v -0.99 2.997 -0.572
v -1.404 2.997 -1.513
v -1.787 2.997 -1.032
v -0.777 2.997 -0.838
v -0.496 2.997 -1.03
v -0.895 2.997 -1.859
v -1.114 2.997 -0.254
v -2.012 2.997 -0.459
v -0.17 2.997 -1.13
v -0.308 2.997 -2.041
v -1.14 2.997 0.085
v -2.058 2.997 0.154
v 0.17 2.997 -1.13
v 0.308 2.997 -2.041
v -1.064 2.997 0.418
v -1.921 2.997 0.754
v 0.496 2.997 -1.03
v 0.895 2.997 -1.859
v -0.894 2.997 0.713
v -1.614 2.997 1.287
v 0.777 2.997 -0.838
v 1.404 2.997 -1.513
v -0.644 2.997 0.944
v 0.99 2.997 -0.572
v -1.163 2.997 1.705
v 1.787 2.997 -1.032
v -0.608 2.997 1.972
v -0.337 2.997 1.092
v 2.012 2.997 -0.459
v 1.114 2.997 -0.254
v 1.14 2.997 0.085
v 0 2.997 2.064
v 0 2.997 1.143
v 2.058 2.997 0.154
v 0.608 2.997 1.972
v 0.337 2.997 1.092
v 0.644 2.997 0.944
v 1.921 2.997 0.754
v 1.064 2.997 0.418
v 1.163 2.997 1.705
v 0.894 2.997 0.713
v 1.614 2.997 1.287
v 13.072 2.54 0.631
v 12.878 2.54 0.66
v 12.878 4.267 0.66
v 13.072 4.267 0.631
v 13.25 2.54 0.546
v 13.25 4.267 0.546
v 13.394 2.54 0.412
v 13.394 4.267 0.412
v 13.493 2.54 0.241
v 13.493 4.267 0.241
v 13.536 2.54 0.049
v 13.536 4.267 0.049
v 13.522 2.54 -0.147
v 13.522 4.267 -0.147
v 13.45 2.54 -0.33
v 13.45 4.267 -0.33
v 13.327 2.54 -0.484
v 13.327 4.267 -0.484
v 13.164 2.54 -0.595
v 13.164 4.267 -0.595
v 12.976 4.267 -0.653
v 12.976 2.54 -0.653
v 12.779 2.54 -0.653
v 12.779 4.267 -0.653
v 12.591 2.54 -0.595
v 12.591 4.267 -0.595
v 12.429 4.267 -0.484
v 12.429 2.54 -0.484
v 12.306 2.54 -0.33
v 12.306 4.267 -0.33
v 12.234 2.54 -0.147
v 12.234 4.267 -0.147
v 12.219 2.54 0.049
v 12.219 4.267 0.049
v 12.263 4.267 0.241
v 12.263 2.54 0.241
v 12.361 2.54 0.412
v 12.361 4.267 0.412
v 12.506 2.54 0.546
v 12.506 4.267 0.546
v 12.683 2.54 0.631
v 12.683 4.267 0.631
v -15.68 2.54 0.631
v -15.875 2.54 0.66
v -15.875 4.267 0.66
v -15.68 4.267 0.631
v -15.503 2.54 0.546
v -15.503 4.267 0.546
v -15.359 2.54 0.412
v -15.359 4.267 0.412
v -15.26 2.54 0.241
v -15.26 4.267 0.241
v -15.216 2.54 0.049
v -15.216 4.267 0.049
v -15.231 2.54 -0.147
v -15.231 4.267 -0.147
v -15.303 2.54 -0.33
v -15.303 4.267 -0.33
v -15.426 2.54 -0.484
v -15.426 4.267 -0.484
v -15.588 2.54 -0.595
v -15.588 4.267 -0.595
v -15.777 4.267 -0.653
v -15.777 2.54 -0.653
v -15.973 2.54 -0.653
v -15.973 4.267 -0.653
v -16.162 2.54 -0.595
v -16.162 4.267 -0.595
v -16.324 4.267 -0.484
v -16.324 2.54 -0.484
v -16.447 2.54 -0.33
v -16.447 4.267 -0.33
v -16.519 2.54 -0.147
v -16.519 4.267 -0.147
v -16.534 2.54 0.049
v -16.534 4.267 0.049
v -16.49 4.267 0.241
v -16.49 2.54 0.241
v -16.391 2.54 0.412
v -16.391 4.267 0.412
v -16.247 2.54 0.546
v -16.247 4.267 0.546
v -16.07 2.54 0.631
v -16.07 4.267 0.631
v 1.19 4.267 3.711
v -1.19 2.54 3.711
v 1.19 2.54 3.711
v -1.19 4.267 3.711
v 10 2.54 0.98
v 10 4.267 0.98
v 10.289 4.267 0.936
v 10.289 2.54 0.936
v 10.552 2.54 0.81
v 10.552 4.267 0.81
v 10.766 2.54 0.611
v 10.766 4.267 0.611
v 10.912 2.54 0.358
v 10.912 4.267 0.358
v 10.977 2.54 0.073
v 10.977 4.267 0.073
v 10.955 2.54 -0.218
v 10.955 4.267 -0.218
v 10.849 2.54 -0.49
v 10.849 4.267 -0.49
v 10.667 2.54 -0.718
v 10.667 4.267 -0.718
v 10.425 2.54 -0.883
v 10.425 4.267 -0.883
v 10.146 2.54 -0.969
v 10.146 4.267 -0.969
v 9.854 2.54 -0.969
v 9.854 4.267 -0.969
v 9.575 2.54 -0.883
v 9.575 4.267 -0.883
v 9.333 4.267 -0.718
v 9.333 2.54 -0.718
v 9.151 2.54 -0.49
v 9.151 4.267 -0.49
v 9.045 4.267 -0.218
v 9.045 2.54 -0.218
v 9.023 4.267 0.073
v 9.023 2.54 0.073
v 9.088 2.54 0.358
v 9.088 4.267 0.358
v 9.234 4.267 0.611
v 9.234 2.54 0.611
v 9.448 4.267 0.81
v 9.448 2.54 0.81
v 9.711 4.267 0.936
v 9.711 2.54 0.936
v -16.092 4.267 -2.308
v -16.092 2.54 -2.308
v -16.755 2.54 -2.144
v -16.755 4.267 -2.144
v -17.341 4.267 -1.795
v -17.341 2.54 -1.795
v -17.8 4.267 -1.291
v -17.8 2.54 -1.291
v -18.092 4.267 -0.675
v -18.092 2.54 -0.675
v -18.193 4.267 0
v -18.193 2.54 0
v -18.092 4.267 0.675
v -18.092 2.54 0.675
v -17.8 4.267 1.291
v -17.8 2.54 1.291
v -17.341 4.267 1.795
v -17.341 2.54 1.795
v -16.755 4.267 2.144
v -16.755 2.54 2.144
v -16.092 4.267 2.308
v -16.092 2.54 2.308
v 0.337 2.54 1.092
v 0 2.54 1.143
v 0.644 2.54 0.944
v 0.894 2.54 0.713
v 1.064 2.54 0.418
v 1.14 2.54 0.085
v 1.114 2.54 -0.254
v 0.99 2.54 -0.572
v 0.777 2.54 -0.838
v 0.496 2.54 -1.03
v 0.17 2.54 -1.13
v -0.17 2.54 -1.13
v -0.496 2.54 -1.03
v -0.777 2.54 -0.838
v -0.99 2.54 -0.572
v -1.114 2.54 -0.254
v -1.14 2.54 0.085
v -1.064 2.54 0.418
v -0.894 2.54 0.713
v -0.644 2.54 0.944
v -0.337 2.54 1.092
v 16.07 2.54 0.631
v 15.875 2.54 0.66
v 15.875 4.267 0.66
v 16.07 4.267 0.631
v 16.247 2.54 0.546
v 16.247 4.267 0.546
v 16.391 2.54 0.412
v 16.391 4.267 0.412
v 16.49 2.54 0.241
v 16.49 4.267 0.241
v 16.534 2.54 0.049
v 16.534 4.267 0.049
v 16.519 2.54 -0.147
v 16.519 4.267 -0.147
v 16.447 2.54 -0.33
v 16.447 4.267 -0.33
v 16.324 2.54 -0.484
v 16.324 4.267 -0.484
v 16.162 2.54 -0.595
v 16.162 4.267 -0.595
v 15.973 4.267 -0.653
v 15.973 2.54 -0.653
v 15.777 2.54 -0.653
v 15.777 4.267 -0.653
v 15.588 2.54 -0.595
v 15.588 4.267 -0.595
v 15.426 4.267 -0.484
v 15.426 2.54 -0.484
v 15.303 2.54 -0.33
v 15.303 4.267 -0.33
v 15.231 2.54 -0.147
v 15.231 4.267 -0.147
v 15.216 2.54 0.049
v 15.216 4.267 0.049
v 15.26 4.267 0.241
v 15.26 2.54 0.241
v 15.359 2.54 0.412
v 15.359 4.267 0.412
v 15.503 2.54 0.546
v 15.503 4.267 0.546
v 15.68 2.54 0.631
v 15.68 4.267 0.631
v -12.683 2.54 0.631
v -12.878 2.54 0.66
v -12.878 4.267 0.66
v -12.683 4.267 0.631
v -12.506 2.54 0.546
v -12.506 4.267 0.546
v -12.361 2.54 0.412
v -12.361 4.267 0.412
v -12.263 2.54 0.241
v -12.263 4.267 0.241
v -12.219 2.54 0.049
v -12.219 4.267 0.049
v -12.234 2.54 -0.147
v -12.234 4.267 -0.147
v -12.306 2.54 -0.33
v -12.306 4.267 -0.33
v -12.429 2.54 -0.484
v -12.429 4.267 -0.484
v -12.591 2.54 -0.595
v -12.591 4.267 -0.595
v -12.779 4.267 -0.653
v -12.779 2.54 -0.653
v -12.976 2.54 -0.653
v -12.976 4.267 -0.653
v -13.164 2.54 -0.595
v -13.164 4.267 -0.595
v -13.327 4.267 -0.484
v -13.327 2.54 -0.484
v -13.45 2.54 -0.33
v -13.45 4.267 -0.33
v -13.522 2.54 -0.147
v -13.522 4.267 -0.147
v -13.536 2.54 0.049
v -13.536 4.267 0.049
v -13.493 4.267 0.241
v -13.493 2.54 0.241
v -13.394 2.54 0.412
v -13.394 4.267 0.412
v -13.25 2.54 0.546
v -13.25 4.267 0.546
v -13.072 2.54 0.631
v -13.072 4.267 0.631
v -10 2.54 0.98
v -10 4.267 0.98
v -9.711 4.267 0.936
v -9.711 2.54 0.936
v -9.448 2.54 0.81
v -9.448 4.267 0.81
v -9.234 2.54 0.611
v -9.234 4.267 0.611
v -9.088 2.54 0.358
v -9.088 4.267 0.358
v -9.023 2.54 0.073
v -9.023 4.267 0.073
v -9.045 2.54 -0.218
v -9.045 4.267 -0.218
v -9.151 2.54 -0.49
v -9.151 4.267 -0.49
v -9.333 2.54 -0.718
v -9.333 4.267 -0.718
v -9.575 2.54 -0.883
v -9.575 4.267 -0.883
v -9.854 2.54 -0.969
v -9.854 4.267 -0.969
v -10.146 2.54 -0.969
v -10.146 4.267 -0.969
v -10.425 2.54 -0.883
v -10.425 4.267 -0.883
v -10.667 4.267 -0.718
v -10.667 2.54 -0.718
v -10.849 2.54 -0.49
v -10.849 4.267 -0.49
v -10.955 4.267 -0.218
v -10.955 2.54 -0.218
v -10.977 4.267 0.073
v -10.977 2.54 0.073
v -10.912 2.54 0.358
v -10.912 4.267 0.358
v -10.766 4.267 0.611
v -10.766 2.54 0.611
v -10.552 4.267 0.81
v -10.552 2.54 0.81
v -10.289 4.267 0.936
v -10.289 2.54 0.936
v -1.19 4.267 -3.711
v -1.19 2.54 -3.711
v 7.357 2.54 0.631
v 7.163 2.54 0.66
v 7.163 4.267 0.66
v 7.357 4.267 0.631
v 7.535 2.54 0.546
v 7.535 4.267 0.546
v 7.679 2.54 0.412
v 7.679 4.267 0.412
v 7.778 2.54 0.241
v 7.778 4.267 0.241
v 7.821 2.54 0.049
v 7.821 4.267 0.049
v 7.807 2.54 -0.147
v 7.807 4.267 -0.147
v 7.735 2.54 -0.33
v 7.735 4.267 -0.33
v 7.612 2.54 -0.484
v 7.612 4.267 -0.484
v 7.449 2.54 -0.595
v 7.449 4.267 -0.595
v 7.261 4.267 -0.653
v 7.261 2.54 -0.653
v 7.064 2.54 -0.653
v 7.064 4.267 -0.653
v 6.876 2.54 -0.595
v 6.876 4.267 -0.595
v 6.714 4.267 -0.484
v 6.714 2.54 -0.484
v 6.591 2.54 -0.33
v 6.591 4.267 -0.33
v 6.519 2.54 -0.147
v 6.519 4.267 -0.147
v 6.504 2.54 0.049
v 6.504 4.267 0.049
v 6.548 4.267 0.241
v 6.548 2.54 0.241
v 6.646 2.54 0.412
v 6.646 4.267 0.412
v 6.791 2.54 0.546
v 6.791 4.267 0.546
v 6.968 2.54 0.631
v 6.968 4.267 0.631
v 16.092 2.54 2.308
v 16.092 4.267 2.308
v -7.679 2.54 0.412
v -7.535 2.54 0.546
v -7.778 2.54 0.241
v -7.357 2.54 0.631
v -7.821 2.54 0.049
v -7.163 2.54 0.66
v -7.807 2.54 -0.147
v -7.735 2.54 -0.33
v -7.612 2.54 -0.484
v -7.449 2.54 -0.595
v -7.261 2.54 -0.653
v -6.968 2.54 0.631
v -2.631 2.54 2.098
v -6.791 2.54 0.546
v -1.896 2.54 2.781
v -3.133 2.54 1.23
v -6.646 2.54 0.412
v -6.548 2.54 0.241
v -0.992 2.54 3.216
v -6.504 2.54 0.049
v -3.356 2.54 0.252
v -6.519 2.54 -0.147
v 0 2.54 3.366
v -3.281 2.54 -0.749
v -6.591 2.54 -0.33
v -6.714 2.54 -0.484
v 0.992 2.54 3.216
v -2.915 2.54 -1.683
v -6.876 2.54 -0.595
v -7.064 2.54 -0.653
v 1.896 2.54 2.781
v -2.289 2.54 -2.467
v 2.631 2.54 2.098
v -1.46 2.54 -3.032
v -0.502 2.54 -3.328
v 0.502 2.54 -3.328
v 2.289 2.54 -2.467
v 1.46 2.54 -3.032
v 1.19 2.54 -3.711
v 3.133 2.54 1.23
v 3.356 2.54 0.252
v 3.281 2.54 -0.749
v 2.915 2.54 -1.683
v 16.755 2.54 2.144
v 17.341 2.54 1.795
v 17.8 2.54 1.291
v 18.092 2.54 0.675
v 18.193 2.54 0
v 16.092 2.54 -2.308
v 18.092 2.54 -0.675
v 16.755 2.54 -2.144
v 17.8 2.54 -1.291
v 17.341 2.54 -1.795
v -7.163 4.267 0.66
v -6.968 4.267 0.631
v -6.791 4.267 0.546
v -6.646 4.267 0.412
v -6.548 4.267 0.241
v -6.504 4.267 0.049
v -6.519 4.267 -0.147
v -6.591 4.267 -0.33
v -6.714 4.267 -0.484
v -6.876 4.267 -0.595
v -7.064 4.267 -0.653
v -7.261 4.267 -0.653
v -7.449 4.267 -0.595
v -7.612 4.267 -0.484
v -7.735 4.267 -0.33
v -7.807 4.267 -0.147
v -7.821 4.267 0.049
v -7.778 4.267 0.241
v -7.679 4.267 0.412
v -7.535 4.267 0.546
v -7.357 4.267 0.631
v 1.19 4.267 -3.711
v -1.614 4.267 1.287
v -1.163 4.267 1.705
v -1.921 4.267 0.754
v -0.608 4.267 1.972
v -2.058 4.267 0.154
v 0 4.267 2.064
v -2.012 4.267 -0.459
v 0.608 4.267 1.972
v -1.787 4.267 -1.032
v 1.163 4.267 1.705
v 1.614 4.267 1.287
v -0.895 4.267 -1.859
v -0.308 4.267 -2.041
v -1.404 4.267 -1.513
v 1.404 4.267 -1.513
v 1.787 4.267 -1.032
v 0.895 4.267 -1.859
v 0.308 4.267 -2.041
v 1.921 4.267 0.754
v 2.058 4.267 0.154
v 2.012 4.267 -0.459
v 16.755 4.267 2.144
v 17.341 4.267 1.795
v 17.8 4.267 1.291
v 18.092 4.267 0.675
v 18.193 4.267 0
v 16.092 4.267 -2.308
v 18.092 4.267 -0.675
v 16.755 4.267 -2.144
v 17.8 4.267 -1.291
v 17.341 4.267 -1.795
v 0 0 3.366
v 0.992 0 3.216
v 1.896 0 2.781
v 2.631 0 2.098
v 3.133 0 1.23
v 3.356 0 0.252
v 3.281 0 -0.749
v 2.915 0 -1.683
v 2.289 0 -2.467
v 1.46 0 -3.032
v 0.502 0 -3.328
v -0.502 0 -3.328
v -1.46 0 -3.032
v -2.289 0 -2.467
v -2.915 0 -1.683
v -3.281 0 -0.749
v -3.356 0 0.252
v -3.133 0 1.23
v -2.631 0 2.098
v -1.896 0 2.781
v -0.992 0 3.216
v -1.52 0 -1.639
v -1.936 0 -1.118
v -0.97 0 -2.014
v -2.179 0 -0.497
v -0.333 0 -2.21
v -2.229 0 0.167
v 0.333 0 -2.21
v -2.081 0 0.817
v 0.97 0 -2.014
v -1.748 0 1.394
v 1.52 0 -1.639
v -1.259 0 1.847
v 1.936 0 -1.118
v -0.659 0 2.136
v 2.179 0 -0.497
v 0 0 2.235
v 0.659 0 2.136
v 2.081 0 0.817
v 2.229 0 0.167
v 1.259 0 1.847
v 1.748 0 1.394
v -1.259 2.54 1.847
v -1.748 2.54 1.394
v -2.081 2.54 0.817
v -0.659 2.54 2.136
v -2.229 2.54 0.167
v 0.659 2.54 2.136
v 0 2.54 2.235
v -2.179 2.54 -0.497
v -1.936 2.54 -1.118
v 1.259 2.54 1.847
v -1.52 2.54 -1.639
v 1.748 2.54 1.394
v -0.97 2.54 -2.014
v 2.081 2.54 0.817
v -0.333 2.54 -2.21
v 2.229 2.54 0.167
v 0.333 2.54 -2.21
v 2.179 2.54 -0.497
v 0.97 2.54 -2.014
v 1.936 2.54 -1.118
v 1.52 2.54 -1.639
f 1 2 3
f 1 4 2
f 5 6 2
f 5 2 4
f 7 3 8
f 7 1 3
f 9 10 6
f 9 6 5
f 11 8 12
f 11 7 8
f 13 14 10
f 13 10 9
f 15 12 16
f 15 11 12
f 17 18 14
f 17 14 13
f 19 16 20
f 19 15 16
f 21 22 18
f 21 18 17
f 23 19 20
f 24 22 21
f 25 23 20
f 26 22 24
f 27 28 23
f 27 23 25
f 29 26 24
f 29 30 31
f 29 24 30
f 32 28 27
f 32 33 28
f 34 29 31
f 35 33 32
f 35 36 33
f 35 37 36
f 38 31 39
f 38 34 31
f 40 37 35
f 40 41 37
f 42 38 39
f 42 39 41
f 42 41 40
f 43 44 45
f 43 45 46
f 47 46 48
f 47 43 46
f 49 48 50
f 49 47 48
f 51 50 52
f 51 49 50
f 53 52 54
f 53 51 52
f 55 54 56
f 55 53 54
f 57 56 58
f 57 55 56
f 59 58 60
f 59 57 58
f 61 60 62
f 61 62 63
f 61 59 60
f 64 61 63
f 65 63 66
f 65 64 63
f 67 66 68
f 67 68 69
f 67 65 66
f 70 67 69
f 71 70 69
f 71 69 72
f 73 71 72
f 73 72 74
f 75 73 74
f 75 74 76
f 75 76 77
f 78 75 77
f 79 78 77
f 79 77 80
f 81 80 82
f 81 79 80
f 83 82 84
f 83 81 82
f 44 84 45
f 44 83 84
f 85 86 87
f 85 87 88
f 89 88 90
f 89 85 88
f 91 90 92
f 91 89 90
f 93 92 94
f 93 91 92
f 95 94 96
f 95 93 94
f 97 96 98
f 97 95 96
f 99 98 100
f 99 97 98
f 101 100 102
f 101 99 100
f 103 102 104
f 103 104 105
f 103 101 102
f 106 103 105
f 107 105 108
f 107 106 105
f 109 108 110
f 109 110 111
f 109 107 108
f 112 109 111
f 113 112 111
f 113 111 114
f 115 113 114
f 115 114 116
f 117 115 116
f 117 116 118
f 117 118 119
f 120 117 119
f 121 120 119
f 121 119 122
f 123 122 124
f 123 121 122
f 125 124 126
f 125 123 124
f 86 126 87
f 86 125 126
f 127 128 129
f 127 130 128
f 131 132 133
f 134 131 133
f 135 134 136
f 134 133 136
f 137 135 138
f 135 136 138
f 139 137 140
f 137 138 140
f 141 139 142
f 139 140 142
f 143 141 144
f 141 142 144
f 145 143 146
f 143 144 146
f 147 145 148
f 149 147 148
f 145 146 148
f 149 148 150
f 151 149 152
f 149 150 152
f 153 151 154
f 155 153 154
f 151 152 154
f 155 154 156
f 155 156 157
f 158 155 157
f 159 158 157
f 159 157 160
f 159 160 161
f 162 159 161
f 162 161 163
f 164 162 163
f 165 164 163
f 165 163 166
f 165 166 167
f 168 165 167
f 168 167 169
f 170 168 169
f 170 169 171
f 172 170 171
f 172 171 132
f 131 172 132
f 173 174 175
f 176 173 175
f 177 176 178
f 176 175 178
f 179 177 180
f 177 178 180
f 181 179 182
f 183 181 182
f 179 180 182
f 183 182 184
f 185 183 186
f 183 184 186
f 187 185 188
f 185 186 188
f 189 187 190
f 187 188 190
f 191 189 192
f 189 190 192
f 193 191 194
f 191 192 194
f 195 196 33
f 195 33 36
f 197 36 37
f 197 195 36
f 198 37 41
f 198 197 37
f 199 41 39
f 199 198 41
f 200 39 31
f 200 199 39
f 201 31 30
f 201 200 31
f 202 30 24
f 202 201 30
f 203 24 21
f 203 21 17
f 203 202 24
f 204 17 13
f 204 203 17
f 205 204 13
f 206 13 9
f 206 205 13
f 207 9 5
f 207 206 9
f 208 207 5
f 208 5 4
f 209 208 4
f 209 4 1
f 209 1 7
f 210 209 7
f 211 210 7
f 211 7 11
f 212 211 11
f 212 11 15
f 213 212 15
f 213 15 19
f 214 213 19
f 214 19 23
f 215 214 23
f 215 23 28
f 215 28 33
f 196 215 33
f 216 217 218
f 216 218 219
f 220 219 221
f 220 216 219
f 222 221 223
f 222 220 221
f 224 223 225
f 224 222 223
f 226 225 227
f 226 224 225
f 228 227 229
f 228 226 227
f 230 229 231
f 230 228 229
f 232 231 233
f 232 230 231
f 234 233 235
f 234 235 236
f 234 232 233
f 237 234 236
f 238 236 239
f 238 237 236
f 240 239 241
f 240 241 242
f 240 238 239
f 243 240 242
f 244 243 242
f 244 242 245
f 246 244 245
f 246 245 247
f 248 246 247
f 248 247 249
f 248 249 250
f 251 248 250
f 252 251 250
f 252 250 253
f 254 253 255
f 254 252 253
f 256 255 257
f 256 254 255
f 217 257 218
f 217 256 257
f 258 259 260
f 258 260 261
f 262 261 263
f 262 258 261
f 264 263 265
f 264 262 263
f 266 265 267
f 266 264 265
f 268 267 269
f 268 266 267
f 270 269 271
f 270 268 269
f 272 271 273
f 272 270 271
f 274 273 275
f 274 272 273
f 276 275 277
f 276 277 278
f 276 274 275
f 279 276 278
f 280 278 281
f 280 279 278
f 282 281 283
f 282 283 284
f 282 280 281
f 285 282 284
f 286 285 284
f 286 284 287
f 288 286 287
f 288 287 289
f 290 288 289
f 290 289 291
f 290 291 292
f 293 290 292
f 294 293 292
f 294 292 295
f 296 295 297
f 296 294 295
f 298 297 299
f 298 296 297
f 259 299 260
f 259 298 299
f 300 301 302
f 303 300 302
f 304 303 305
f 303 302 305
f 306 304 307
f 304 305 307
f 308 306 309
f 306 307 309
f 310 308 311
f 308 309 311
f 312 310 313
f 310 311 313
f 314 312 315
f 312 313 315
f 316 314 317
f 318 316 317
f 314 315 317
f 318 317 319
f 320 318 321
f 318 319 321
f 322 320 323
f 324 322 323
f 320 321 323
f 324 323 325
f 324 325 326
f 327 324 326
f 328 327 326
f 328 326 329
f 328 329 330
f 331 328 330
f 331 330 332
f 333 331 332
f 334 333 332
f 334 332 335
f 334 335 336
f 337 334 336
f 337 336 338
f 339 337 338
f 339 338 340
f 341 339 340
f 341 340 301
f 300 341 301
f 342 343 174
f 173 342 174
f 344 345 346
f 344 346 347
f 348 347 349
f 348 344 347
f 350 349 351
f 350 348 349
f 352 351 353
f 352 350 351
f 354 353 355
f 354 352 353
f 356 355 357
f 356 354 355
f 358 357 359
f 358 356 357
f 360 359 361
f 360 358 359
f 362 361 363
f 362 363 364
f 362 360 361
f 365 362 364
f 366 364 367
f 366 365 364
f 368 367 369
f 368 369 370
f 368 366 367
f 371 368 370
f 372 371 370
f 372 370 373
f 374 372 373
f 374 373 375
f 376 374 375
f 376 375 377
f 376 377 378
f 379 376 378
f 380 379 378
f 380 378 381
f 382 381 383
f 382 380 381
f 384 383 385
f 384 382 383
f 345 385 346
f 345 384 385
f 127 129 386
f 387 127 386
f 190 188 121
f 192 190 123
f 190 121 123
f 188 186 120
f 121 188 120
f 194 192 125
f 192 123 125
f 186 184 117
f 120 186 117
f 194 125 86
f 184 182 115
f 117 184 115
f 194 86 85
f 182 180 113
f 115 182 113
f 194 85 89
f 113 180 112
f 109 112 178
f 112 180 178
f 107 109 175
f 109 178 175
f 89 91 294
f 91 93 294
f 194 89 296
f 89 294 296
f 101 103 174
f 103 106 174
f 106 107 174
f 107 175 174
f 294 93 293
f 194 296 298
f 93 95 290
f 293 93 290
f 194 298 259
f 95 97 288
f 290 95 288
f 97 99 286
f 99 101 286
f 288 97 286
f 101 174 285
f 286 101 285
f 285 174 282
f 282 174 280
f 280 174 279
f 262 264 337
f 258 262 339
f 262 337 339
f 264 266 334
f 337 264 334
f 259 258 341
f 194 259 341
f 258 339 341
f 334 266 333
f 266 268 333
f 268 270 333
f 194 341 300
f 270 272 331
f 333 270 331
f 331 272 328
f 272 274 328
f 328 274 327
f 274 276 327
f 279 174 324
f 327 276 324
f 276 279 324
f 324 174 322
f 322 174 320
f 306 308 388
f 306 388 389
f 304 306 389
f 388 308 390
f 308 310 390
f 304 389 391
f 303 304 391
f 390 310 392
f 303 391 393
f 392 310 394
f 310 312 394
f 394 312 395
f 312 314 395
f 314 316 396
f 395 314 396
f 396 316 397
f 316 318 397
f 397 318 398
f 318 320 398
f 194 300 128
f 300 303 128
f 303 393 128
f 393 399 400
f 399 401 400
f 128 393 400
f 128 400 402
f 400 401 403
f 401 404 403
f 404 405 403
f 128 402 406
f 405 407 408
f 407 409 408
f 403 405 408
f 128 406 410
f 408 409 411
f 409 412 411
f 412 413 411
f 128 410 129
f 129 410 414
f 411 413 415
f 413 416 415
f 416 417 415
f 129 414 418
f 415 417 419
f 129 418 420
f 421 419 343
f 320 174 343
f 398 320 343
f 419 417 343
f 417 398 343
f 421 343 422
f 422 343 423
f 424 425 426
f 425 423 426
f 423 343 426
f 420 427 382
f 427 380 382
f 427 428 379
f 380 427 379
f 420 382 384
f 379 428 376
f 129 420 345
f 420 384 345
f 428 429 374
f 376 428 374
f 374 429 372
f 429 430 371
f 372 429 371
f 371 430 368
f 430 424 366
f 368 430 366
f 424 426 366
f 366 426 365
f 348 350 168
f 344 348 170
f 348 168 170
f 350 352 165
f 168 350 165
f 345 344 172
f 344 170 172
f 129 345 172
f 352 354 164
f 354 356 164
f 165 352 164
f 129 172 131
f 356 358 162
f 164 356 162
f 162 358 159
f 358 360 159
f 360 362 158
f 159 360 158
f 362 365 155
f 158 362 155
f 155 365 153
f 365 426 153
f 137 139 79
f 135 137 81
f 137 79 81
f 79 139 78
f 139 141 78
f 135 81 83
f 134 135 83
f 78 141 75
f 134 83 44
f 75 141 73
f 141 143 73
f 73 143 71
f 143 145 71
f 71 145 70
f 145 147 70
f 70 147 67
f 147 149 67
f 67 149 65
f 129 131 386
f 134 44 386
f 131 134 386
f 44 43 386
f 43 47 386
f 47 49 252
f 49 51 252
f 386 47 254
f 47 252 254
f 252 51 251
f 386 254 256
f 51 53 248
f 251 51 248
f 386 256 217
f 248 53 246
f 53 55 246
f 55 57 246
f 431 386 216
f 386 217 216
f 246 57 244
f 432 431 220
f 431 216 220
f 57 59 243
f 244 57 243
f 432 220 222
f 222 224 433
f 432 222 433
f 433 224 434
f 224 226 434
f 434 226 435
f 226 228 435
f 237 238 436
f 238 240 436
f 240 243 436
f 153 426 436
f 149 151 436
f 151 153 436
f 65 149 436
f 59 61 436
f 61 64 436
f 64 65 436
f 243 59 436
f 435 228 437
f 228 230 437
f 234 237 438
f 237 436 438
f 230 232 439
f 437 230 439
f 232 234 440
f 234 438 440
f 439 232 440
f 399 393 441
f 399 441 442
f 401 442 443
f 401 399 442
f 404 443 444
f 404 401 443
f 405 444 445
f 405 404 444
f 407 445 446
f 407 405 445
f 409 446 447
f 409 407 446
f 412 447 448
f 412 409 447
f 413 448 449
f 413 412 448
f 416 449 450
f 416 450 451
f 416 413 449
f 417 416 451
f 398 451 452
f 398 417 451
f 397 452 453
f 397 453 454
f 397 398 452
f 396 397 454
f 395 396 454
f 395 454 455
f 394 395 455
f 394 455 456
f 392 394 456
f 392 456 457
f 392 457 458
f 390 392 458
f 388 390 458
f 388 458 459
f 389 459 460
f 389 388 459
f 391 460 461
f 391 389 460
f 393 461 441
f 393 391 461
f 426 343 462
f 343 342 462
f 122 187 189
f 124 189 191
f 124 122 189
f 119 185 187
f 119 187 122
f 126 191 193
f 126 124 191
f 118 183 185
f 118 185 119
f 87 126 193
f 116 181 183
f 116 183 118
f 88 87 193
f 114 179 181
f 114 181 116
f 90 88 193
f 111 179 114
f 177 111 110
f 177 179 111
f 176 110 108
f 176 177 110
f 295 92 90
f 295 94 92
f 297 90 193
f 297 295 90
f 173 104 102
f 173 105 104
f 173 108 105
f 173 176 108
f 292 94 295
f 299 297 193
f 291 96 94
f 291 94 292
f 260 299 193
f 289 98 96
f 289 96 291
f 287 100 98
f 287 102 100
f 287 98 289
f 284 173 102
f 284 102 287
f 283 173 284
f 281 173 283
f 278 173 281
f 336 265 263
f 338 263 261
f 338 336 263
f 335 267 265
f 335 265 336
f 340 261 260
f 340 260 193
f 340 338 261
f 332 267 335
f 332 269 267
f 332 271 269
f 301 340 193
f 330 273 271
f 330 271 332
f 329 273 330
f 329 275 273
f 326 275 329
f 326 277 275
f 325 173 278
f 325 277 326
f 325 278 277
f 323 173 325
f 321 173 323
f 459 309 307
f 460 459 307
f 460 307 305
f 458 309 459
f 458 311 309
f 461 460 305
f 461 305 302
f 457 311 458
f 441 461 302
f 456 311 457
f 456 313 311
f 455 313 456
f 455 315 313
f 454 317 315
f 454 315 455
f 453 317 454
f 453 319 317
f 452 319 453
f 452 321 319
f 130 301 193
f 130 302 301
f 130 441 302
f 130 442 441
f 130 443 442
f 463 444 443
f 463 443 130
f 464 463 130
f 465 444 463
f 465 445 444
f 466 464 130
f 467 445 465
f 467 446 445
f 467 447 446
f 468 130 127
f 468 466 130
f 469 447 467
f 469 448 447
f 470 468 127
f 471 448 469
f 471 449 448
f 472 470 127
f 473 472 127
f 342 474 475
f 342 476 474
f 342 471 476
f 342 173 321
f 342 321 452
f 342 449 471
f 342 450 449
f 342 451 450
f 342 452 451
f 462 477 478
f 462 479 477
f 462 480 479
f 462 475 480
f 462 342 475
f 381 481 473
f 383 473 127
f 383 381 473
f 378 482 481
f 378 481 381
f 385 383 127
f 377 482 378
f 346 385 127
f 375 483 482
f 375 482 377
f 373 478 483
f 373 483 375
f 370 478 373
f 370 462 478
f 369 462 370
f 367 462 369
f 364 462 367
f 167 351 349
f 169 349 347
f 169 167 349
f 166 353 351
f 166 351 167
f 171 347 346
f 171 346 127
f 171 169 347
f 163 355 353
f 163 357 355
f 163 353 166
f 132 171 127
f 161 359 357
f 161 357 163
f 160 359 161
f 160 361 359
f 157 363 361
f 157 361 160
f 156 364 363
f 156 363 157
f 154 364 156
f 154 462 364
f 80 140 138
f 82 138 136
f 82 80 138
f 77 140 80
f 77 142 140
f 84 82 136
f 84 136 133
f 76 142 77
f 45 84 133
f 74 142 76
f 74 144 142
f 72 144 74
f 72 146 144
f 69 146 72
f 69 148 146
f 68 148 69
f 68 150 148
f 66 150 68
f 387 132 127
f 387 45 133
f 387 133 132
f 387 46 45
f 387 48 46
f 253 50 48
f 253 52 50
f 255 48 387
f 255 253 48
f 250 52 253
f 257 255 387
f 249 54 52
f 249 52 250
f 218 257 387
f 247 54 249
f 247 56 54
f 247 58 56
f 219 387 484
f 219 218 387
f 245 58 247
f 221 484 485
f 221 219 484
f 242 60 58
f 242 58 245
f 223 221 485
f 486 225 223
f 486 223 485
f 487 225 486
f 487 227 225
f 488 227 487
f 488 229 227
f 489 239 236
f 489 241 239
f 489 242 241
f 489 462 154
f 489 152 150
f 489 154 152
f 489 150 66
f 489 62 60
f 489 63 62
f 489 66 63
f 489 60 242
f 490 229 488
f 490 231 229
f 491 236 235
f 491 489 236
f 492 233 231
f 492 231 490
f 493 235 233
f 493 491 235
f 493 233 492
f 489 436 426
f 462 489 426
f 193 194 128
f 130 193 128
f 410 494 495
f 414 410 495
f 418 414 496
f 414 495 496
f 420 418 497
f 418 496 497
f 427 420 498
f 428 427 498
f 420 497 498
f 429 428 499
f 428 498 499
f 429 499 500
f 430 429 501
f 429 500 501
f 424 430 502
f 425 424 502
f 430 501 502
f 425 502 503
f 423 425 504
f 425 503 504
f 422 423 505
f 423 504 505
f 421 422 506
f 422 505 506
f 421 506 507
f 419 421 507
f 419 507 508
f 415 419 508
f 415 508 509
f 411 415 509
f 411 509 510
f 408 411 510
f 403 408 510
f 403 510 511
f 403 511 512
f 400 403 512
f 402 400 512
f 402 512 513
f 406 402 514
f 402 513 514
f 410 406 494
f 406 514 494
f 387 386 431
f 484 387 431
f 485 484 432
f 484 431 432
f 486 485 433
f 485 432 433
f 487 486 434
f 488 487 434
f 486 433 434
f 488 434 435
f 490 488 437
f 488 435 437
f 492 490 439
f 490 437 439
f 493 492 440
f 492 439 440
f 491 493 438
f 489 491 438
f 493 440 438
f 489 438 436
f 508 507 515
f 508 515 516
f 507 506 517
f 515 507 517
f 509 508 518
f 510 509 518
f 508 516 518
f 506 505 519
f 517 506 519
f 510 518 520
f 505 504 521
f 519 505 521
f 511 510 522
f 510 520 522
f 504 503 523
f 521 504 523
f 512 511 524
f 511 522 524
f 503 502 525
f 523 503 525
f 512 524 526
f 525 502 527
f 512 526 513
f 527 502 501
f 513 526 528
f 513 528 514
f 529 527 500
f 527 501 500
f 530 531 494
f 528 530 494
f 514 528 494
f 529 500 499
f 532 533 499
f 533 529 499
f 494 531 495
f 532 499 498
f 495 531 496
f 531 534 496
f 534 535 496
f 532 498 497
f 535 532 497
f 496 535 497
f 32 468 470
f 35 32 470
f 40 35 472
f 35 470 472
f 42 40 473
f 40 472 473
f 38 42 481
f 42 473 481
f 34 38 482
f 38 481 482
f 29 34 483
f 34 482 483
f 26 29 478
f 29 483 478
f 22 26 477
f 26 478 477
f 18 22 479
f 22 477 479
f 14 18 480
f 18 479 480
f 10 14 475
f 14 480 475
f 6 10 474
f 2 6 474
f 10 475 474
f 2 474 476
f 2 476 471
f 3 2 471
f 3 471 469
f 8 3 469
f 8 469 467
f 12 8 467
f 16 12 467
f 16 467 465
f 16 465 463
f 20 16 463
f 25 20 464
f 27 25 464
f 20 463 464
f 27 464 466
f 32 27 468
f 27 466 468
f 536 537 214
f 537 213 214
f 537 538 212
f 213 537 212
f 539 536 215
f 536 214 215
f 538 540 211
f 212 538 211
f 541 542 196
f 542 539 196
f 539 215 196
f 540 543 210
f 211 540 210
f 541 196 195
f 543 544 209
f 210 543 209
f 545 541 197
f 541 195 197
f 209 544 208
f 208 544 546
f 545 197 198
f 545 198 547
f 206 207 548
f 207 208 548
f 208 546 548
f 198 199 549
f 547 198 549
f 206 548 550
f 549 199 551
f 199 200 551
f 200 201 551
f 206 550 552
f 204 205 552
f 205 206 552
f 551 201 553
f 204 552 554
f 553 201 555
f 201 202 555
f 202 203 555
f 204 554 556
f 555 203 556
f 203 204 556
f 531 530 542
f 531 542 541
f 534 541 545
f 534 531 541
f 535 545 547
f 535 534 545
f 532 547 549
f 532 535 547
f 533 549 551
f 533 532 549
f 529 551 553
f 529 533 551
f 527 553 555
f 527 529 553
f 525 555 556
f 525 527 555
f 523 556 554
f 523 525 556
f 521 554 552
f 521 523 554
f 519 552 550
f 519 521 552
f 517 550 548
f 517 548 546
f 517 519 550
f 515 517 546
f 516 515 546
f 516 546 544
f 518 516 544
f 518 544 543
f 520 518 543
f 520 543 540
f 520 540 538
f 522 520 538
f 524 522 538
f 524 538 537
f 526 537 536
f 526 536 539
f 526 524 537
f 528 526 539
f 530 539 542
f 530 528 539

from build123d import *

# Parameters (mm, degrees)
SKETCH1_R           = 3.3655
SKETCH1_R_2         = 2.2352
BOSS_EXTRUDE1_DEPTH = 2.54
SKETCH2_R           = 0.6604
SKETCH2_R_2         = 2.31775
SKETCH2_R_3         = 3.3655
SKETCH2_R_4         = 2.2352
SKETCH2_R_5         = 1.143
BOSS_EXTRUDE2_DEPTH = 1.7272
FILLET1_R           = 12.7
SKETCH3_R           = 2.06375
SKETCH3_R_2         = 1.143
CUT_EXTRUDE1_DEPTH  = 1.27
SKETCH8_R           = 0.98
CUT_EXTRUDE4_DEPTH  = 20.062316393


with BuildPart() as part:
    # Sketch1 → Boss-Extrude1 (new body)
    with BuildSketch(Plane(origin=(0, 0, 0), x_dir=(1, 0, 0), z_dir=(0, 1, 0))):
        with Locations(Location((0, 0, 0), (0, 0, 270))):
            Circle(SKETCH1_R)
        with Locations(Location((0, 0, 0), (0, 0, 270))):
            Circle(SKETCH1_R_2, mode=Mode.SUBTRACT)
    extrude(amount=BOSS_EXTRUDE1_DEPTH)

    # Sketch2 → Boss-Extrude2 (add)
    with BuildSketch(Plane(origin=(0, 2.54, 0), x_dir=(1, 0, 0), z_dir=(0, 1, 0))):
        with BuildLine():
            ThreePointArc((-0.713521748, -3.755518873), (-3.8227, 0), (-0.713521748, 3.755518873))
            Line((-0.713521748, 3.755518873), (-16.092265178, 2.307544345))
            ThreePointArc((-16.092265178, 2.307544345), (-14.314807913, 1.713991165), (-13.55725, 0))
            ThreePointArc((-13.55725, 0), (-14.314807913, -1.713991165), (-16.092265178, -2.307544345))
            Line((-16.092265178, -2.307544345), (-0.713521748, -3.755518873))
        make_face()
        with Locations(Location((-12.8778, 0, 0), (0, 0, 270))):
            Circle(SKETCH2_R, mode=Mode.SUBTRACT)
        with Locations(Location((-9.8806, 0, 0), (0, 0, 270))):
            Circle(SKETCH2_R, mode=Mode.SUBTRACT)
        with Locations(Location((-7.1628, 0, 0), (0, 0, 270))):
            Circle(SKETCH2_R, mode=Mode.SUBTRACT)
        with Locations((-15.875, 0)):
            Circle(SKETCH2_R_2)
        with Locations(Location((-15.875, 0, 0), (0, 0, 270))):
            Circle(SKETCH2_R, mode=Mode.SUBTRACT)
        with BuildLine():
            Line((16.092265178, 2.307544345), (0.713521748, 3.755518873))
            ThreePointArc((0.713521748, 3.755518873), (2.944538578, 2.437771083), (3.8227, 0))
            ThreePointArc((3.8227, 0), (2.944538578, -2.437771083), (0.713521748, -3.755518873))
            Line((0.713521748, -3.755518873), (16.092265178, -2.307544345))
            ThreePointArc((16.092265178, -2.307544345), (13.55725, 0), (16.092265178, 2.307544345))
        make_face()
        with Locations(Location((7.1628, 0, 0), (0, 0, 270))):
            Circle(SKETCH2_R, mode=Mode.SUBTRACT)
        with Locations(Location((9.8806, 0, 0), (0, 0, 270))):
            Circle(SKETCH2_R, mode=Mode.SUBTRACT)
        with Locations(Location((12.8778, 0, 0), (0, 0, 270))):
            Circle(SKETCH2_R, mode=Mode.SUBTRACT)
        with Locations((15.875, 0)):
            Circle(SKETCH2_R_2)
        with Locations(Location((15.875, 0, 0), (0, 0, 270))):
            Circle(SKETCH2_R, mode=Mode.SUBTRACT)
        with BuildLine():
            Line((0.713521748, 3.755518873), (0, 3.8227))
            Line((0, 3.8227), (-0.713521748, 3.755518873))
            ThreePointArc((-0.713521748, 3.755518873), (-3.8227, 0), (-0.713521748, -3.755518873))
            Line((-0.713521748, -3.755518873), (0, -3.8227))
            Line((0, -3.8227), (0.713521748, -3.755518873))
            ThreePointArc((0.713521748, -3.755518873), (2.944538578, -2.437771083), (3.8227, 0))
            ThreePointArc((3.8227, 0), (2.944538578, 2.437771083), (0.713521748, 3.755518873))
        make_face()
        with Locations(Location((0, 0, 0), (0, 0, 270))):
            Circle(SKETCH2_R_3, mode=Mode.SUBTRACT)
        with Locations(Location((0, 0, 0), (0, 0, 270))):
            Circle(SKETCH2_R_3)
        with Locations(Location((0, 0, 0), (0, 0, 270))):
            Circle(SKETCH2_R_4, mode=Mode.SUBTRACT)
        with Locations(Location((0, 0, 0), (0, 0, 270))):
            Circle(SKETCH2_R_4)
        with Locations(Location((0, 0, 0), (0, 0, 270))):
            Circle(SKETCH2_R_5, mode=Mode.SUBTRACT)
    extrude(amount=BOSS_EXTRUDE2_DEPTH)

    # Fillet1
    fillet1_edges = [part.edges().sort_by_distance(p)[0] for p in [
        (0, 3.4036, -3.8227),
        (0, 3.4036, 3.8227),
    ]]
    fillet(fillet1_edges, radius=FILLET1_R)

    # Sketch3 → Cut-Extrude1 (cut)
    with BuildSketch(Plane(origin=(0, 4.2672, 0), x_dir=(1, 0, 0), z_dir=(0, 1, 0))):
        with Locations(Location((0, 0, 0), (0, 0, 270))):
            Circle(SKETCH3_R)
        with Locations(Location((0, 0, 0), (0, 0, 270))):
            Circle(SKETCH3_R_2, mode=Mode.SUBTRACT)
    extrude(amount=-CUT_EXTRUDE1_DEPTH, mode=Mode.SUBTRACT)

    # Sketch8 → Cut-Extrude4 (cut, through all)
    with BuildSketch(Plane(origin=(0, 4.2672, 0), x_dir=(1, 0, 0), z_dir=(0, 1, 0))):
        with Locations(Location((10, 0, 0), (0, 0, 270))):
            Circle(SKETCH8_R)
        with Locations(Location((-10, 0, 0), (0, 0, 270))):
            Circle(SKETCH8_R)
    extrude(amount=-CUT_EXTRUDE4_DEPTH, mode=Mode.SUBTRACT)


solid = part.part
